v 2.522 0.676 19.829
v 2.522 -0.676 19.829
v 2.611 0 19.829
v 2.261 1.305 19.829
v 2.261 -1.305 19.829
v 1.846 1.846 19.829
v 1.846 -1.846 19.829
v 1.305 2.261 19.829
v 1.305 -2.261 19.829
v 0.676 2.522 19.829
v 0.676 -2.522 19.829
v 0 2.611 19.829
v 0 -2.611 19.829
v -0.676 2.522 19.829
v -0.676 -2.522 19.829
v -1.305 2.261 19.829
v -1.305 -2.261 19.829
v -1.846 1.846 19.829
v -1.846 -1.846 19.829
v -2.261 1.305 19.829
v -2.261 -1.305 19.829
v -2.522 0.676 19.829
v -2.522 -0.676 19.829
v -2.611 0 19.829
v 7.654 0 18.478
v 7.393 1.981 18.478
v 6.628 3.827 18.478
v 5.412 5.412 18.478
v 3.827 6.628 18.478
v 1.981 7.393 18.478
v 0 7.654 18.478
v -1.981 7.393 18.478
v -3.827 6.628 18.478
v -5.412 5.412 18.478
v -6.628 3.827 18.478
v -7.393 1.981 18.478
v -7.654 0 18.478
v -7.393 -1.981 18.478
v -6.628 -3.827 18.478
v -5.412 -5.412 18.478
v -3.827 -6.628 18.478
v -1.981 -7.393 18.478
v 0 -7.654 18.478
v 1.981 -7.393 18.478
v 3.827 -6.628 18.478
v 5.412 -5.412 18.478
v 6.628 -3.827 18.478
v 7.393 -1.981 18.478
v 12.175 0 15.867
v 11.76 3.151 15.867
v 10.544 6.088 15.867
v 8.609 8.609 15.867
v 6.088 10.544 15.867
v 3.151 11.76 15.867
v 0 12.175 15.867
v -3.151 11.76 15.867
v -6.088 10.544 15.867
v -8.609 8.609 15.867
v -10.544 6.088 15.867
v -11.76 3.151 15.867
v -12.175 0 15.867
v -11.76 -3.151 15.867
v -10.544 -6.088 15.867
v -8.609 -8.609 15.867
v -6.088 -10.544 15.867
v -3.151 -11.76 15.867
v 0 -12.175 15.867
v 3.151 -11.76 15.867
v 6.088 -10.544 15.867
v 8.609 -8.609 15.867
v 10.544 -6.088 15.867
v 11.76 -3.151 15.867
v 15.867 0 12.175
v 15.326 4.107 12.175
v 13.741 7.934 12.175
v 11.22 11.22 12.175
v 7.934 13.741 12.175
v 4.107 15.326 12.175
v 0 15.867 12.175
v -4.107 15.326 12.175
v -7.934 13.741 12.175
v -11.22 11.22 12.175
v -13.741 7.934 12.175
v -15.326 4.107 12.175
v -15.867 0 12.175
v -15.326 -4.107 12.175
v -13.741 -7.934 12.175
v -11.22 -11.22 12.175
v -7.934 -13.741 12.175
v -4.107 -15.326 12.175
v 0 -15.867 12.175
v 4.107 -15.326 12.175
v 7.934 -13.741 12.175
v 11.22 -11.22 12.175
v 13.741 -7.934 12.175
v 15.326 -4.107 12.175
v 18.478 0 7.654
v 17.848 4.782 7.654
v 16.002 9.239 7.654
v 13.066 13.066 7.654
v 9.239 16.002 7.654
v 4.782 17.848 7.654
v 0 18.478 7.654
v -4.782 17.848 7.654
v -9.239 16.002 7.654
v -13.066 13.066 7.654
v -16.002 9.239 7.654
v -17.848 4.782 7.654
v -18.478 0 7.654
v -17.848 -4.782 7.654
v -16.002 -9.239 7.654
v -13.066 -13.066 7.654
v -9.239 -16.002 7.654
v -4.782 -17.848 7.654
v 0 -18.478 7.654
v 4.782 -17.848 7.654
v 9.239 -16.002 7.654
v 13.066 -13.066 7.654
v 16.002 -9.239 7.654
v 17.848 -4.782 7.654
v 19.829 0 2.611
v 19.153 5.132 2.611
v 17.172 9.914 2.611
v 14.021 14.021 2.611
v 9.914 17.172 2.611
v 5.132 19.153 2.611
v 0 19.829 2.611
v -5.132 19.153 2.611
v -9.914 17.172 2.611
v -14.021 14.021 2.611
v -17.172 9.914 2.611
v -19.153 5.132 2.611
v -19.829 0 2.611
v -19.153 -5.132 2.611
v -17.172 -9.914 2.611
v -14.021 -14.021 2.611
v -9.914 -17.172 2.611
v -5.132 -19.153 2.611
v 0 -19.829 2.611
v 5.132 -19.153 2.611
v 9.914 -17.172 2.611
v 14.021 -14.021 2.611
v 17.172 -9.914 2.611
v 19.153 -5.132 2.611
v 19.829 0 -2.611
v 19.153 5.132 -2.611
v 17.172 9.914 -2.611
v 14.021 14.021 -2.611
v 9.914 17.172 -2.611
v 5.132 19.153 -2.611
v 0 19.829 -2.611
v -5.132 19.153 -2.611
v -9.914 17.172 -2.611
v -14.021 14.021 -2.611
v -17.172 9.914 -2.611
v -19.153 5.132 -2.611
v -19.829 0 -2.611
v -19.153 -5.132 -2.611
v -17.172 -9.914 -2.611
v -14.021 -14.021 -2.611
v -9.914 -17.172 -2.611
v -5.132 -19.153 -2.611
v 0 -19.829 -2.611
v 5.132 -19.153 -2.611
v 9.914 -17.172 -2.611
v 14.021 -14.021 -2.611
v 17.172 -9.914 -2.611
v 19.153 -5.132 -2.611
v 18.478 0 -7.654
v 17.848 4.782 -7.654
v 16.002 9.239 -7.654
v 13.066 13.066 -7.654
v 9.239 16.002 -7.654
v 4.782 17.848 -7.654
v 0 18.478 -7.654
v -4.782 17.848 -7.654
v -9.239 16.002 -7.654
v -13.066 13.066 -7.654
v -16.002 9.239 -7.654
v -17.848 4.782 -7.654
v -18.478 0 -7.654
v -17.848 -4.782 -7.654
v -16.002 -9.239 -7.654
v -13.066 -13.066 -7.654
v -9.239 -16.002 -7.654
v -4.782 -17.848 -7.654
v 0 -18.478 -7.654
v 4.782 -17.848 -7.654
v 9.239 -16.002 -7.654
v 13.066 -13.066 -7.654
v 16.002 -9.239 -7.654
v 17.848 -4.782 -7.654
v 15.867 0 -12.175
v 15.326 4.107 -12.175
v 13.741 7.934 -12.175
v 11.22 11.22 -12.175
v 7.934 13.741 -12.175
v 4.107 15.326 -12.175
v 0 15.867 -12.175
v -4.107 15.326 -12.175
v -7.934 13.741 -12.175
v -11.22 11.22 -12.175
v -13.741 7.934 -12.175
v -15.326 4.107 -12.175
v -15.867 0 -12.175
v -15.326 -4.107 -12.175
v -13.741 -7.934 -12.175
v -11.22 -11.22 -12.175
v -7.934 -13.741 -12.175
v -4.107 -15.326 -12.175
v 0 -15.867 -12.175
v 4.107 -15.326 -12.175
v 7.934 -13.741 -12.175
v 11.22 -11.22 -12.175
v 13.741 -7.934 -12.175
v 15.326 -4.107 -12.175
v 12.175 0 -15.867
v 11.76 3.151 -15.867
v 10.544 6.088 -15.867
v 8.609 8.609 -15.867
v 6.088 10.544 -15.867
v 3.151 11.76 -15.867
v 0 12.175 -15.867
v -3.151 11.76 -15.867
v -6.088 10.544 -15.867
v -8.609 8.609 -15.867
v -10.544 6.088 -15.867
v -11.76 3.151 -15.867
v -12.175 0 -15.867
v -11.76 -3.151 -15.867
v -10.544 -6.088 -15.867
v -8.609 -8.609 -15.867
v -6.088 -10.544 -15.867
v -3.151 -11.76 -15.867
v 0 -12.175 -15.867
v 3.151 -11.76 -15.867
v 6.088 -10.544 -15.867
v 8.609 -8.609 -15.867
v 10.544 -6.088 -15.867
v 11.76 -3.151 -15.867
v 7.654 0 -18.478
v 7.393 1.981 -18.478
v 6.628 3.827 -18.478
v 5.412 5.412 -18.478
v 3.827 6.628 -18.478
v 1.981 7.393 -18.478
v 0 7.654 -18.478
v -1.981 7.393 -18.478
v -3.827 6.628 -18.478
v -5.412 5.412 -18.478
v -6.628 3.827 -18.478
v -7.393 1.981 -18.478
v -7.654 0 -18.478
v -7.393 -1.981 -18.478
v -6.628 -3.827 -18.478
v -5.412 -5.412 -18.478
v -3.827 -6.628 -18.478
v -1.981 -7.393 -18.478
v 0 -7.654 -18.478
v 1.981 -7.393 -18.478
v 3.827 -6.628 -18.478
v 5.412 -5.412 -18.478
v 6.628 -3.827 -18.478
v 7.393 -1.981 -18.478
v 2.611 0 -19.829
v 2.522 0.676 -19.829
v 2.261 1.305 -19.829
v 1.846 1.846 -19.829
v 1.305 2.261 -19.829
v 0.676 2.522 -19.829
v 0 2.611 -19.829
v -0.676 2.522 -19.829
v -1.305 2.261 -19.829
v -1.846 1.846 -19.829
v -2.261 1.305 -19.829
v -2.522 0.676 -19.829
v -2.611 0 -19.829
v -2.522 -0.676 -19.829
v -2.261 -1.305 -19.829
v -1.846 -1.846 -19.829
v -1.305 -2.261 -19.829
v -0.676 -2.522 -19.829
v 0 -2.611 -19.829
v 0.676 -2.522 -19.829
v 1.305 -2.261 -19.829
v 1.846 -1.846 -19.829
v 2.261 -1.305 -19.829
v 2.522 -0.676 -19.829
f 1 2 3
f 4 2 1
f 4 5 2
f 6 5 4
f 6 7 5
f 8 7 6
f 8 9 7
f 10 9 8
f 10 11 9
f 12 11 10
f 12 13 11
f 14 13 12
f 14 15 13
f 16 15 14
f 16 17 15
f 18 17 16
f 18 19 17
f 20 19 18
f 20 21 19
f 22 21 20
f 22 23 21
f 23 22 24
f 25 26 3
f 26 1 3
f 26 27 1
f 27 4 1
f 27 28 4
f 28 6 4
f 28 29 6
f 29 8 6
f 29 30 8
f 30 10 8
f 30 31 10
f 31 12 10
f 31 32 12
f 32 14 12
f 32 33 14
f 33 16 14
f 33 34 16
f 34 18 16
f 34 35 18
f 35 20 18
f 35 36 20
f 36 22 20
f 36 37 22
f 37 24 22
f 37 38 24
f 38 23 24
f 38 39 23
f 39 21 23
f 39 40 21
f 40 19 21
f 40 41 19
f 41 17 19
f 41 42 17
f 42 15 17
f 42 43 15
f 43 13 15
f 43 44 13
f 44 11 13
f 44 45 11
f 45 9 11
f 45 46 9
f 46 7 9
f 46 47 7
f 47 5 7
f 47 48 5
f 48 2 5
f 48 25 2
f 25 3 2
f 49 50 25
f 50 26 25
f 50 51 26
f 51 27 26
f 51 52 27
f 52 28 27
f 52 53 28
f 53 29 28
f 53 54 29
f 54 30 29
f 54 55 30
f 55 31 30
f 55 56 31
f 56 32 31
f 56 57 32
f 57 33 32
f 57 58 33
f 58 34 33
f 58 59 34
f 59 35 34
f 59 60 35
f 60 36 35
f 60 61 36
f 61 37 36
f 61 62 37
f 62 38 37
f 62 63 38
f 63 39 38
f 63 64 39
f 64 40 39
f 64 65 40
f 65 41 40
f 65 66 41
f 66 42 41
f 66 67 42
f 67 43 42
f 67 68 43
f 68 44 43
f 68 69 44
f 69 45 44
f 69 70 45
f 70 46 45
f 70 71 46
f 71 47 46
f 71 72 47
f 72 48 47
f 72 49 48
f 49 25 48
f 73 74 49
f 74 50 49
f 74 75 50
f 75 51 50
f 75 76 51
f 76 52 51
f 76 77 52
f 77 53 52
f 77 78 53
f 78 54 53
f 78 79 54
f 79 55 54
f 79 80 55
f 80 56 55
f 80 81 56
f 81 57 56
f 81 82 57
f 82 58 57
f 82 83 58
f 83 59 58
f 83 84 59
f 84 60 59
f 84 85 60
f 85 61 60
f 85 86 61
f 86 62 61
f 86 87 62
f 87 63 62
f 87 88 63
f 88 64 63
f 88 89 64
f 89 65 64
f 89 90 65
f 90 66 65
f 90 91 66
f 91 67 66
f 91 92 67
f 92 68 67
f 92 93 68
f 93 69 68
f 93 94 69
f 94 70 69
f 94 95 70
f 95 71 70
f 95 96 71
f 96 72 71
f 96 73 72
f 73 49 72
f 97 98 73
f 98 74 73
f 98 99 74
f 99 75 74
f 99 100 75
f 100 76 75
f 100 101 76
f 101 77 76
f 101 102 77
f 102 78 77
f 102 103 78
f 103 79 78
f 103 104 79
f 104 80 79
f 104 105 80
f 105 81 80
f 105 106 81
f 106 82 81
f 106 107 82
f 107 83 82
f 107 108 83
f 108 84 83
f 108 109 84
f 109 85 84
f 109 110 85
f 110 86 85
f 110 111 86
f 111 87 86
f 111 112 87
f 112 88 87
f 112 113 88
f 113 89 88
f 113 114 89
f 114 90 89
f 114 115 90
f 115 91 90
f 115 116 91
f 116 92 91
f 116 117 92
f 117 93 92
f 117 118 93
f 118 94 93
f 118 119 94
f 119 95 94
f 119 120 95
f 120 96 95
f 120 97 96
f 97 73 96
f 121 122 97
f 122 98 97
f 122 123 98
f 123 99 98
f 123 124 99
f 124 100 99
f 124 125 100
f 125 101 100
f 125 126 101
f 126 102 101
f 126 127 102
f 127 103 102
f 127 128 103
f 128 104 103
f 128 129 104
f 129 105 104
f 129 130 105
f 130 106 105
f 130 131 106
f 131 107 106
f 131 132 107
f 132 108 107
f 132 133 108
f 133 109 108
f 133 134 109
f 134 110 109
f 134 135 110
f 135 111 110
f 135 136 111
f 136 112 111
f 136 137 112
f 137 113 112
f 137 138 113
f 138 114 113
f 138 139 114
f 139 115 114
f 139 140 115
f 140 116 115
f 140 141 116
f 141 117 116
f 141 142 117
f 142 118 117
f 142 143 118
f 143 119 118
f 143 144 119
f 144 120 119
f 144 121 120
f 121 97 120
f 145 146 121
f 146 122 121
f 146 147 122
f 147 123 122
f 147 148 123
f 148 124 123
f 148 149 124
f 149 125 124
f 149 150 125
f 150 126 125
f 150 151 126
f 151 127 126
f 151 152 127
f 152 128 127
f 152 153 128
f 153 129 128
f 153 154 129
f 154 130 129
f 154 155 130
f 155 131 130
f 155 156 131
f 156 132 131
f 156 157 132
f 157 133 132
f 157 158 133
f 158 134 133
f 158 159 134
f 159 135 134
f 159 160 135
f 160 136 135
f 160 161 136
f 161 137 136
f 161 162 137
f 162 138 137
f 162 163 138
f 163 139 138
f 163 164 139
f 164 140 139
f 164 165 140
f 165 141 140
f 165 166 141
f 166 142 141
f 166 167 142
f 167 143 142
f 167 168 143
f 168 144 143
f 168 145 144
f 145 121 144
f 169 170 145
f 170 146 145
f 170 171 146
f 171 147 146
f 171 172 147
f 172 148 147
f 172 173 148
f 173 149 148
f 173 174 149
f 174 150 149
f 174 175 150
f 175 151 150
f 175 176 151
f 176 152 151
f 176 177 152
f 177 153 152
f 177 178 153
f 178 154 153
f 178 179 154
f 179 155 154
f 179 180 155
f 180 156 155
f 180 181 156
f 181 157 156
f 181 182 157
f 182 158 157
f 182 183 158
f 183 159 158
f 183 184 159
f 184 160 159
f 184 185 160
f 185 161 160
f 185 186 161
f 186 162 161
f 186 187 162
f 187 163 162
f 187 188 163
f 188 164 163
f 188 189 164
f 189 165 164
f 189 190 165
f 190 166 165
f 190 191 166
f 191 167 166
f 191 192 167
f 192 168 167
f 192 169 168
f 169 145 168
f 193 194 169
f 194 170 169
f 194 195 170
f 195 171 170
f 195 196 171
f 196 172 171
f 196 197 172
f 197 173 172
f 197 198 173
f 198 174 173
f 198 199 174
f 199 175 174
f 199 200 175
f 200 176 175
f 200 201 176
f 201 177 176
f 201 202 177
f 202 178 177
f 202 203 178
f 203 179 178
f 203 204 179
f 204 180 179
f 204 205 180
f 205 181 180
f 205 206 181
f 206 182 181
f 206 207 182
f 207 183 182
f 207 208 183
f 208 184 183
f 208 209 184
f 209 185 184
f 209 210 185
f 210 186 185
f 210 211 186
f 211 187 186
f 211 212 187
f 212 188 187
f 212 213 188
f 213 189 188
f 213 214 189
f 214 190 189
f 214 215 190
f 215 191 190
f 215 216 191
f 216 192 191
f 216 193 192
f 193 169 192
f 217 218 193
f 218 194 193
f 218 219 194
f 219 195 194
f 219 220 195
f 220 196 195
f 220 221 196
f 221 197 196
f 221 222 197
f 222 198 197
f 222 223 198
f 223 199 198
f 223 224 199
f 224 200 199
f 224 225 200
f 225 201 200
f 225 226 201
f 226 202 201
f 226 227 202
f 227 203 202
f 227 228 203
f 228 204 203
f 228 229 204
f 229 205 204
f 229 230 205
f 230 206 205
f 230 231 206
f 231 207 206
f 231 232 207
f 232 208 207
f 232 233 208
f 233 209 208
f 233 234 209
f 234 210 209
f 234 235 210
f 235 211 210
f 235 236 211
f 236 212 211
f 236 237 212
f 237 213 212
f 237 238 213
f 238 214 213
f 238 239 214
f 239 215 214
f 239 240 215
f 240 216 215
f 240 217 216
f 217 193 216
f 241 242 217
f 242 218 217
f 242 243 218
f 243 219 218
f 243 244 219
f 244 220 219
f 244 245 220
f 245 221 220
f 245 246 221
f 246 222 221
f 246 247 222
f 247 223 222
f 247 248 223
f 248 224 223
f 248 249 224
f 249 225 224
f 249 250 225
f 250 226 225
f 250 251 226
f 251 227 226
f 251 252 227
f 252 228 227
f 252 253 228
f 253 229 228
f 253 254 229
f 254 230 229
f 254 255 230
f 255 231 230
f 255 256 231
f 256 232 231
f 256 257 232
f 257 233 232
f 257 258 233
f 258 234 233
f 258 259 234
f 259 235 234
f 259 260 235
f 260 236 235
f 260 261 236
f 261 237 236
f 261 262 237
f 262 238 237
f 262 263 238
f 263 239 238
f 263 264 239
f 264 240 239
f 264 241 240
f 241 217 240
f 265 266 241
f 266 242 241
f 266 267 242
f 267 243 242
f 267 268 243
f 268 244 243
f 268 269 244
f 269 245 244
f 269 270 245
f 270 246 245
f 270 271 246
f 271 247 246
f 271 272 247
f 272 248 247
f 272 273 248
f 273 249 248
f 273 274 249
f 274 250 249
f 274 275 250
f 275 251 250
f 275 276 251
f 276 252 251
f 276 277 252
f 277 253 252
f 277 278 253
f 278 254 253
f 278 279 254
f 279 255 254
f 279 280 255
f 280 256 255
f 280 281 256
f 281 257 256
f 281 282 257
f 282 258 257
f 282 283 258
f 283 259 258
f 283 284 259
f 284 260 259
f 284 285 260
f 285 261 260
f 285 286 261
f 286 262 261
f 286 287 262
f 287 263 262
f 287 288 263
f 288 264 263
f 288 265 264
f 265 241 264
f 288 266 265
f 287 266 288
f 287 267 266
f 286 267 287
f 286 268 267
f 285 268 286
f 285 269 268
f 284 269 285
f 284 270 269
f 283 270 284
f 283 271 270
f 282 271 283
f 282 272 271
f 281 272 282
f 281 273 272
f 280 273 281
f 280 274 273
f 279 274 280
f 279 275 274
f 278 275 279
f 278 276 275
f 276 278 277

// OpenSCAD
// Rendered by smoothrendertest.py in shaded mode, once per fa= value. $fn fixes the
// mesh, so the geometry is identical between runs and only the smoothing tolerance
// (2 * $fa) differs.
fa = 12;
$fa = fa;
sphere(20, $fn = 24);
